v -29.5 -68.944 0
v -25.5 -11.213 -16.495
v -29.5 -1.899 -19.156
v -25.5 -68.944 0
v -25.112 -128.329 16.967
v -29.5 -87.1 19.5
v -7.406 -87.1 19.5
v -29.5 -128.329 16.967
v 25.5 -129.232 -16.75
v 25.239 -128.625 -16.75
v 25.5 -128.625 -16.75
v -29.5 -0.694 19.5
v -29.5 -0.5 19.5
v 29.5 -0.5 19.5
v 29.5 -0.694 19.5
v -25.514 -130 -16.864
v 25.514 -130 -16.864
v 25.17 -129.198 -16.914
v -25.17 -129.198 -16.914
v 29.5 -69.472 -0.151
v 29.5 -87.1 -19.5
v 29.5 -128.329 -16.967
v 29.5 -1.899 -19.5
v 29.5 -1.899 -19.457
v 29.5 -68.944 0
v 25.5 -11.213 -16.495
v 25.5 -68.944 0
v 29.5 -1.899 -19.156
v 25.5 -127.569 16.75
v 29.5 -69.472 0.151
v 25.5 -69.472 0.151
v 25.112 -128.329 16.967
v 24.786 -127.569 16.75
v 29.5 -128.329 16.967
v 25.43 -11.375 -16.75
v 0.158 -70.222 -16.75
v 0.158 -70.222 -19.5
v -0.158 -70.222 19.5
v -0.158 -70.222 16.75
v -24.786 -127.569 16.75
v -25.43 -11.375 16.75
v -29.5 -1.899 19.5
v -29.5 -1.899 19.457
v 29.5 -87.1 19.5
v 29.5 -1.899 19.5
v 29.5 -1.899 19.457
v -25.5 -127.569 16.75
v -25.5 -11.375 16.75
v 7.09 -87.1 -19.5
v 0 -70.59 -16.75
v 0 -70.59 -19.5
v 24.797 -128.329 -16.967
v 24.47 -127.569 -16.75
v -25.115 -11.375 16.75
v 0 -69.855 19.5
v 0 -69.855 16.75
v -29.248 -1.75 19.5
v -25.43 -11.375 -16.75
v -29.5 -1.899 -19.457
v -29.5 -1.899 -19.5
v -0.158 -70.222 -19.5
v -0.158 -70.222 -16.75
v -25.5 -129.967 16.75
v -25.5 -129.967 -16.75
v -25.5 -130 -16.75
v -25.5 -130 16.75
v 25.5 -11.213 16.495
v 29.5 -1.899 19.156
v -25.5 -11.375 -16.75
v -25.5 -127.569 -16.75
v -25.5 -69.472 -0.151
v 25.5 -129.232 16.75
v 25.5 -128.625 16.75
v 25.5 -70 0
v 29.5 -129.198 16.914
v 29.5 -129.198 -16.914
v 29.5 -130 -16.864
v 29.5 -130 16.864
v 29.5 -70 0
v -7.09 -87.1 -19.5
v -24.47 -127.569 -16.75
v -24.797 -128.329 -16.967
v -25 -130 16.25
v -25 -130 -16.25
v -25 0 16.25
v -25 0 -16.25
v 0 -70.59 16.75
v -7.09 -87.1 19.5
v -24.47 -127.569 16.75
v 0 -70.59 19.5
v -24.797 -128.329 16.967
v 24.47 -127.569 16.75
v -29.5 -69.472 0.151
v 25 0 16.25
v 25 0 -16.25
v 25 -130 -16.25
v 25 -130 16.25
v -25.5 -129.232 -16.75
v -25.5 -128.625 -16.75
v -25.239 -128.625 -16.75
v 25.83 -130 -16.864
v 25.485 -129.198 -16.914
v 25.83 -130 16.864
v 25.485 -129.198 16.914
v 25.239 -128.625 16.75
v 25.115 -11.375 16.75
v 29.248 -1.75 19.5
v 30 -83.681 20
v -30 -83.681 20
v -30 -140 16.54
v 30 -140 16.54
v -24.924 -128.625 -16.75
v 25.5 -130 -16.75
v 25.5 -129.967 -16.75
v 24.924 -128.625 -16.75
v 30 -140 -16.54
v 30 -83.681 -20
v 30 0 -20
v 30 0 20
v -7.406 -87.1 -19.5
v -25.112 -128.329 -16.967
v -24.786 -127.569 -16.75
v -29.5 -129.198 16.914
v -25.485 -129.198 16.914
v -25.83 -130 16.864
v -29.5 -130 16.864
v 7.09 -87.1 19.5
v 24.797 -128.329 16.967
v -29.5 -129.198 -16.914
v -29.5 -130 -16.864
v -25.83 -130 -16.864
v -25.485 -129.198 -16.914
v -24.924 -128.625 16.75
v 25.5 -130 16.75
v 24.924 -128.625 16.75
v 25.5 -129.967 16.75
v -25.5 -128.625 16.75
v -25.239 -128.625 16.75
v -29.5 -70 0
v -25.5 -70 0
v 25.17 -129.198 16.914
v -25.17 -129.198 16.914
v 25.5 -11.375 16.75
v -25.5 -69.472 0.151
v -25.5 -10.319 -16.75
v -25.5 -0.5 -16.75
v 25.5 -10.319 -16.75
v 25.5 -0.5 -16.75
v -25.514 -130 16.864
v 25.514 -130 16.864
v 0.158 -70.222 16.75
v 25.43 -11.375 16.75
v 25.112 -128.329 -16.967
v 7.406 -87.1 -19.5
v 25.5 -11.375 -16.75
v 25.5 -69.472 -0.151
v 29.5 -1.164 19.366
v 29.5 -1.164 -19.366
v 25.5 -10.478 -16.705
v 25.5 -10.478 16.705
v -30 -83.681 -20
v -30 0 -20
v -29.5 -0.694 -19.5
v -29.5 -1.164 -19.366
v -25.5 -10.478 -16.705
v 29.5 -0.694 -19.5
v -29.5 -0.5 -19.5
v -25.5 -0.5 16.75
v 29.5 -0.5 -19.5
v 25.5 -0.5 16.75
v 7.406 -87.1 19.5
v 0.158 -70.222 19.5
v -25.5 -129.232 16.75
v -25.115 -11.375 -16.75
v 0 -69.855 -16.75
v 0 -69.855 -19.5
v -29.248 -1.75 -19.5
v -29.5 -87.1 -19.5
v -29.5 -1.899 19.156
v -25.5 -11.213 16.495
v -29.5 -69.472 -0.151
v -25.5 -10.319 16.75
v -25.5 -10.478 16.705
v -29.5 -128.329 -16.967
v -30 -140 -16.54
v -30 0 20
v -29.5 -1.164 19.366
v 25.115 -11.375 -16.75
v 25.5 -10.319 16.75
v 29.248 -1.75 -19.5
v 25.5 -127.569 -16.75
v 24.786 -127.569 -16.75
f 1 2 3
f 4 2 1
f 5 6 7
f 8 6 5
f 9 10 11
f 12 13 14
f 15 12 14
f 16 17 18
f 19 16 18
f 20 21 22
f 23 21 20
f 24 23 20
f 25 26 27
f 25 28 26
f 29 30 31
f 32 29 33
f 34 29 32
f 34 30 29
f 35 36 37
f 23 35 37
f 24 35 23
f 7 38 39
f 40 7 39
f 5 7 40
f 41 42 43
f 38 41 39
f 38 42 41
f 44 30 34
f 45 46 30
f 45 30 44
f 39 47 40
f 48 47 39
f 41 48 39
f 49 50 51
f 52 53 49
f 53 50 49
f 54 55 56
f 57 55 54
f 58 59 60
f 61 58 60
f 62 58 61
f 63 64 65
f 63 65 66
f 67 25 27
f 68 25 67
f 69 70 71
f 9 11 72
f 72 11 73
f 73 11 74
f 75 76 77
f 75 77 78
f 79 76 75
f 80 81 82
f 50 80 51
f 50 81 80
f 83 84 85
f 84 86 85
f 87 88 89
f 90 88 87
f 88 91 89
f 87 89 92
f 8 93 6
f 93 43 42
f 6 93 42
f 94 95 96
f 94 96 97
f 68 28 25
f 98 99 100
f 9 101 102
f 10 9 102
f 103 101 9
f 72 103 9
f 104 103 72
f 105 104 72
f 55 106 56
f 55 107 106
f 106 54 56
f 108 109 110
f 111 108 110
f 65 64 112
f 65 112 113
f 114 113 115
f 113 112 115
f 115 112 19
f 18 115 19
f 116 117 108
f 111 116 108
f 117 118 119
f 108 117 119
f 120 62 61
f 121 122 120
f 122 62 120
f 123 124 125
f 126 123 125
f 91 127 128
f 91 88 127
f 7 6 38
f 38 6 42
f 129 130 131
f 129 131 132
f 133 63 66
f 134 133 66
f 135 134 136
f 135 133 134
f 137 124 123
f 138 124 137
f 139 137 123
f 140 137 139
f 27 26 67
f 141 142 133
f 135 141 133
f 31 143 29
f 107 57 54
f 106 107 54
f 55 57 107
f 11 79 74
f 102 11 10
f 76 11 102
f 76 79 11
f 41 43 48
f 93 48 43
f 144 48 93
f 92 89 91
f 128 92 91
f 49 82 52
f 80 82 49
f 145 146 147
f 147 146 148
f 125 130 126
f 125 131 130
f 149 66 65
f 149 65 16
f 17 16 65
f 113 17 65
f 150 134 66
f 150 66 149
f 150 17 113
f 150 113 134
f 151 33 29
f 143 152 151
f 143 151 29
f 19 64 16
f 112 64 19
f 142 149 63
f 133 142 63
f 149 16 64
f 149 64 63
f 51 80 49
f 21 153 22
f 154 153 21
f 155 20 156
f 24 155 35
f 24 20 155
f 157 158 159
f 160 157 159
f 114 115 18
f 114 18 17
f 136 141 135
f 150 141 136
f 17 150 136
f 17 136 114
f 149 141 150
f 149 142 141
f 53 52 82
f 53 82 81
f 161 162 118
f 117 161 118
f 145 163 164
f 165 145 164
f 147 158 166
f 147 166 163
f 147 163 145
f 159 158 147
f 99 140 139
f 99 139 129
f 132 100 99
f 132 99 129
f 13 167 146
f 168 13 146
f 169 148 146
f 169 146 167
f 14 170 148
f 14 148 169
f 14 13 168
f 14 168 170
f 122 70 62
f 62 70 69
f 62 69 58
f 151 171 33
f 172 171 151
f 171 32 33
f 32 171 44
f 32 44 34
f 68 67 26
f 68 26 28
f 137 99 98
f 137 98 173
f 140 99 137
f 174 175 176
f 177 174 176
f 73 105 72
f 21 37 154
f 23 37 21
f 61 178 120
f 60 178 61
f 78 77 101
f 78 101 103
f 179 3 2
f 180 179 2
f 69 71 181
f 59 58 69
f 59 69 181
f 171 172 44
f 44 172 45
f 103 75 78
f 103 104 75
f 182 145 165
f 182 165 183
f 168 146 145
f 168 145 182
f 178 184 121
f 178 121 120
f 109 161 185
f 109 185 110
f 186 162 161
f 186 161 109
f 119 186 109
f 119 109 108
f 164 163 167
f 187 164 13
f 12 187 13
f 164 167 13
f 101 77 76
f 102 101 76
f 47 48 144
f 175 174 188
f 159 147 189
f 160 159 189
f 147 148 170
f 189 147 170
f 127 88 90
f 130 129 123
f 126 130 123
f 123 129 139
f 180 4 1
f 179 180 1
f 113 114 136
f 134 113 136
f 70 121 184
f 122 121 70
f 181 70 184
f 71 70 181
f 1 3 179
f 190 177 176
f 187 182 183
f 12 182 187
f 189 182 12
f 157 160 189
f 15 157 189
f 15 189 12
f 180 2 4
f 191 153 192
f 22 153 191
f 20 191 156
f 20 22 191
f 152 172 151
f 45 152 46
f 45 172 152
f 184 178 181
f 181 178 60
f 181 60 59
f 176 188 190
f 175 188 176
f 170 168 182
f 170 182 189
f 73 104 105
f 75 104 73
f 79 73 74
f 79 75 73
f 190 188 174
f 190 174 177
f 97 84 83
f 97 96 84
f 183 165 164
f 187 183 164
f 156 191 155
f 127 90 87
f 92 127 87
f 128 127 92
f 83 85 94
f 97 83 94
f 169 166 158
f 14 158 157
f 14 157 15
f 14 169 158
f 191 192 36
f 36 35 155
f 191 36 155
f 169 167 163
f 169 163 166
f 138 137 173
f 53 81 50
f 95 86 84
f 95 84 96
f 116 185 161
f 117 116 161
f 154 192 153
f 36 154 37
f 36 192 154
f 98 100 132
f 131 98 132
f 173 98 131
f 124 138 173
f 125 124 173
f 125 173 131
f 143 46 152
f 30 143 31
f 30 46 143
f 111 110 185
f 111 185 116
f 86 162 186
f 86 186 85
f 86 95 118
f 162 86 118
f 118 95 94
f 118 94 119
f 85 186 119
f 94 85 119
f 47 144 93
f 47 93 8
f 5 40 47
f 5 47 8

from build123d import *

# Parameters (mm, degrees)
F0_W      = 60
F0_H      = 40
F0_W_2    = 50
F0_H_2    = 32.5
F1_DEPTH  = 140
F2_T      = -0.5
F4_DEPTH  = 40
F6_DEPTH  = 60
F7_DEPTH  = 140
F8_W      = 10
F8_H      = 40
F9_DEPTH  = 60
F11_DEPTH = 60
F12_DEPTH = 60


with BuildPart() as f1:
    # F0 (on Front) → F1 (new body)
    with BuildSketch(Plane.XZ):
        Rectangle(F0_W, F0_H)
        Rectangle(F0_W_2, F0_H_2, mode=Mode.SUBTRACT)
    extrude(amount=F1_DEPTH)

    # F2 (hollow: no face is removed)
    offset(amount=F2_T, kind=Kind.INTERSECTION, mode=Mode.SUBTRACT)

    # F3 (on face) → F4 (join, through all)
    with BuildSketch(Plane.XY.offset(20)):
        Polygon((-29.8089313839, -140), (0, -70.5899032727), (-0.1578061569, -70.2224516363), (-30, -139.71), (-30, -140), align=None)
        Polygon((30, -139.71), (0.1578061569, -70.2224516363), (0, -70.5899032727), (29.8089313839, -140), (30, -140), align=None)
        Polygon((-0.1578061569, -70.2224516363), (0, -69.855), (-30, 0), (-30, -0.3179561596), (-30, -0.7349032727), align=None)
        Polygon((0, -70.5899032727), (0.1578061569, -70.2224516363), (0, -69.855), (-0.1578061569, -70.2224516363), align=None)
        Polygon((0.1578061569, -70.2224516363), (30, -0.7349032727), (30, 0), (0, -69.855), align=None)
    extrude(amount=-F4_DEPTH)

    # F5 (on face) → F6 (join, through all)
    with BuildSketch(Plane.YZ.offset(30)):
        Polygon((-69.472192033, 0.1508022763), (-70, 0), (-69.472192033, -0.1508022763), (-68.9443840661, 0), align=None)
        Polygon((0, 20), (-69.472192033, 0.1508022763), (-68.9443840661, 0), (0, 19.6983954474), align=None)
        Polygon((-68.9443840661, 0), (-69.472192033, -0.1508022763), (0, -20), (0, -19.6983954474), align=None)
        Polygon((-140, 20), (-70, 0), (-69.472192033, 0.1508022763), (-138.9443840661, 20), align=None)
        Polygon((-70, 0), (-140, -20), (-138.9443840661, -20), (-69.472192033, -0.1508022763), align=None)
    extrude(amount=-F6_DEPTH)

    # F0 (on Front) → F7 (cut)
    with BuildSketch(Plane.XZ):
        Rectangle(F0_W_2, F0_H_2)
    extrude(amount=F7_DEPTH, mode=Mode.SUBTRACT)

    # F8 (on face) → F9 (join, through all)
    with BuildSketch(Plane.YZ.offset(30)):
        with Locations((-135, 0)):
            Rectangle(F8_W, F8_H)
    extrude(amount=-F9_DEPTH)

    # F10 (on face) → F11 (cut, through all)
    with BuildSketch(Plane(origin=(-30, 0, 0), x_dir=(0, -1, 0), z_dir=(-1, 0, 0))):
        Polygon((83.6813354429, -20), (140, -20), (140, -16.54), align=None)
        Polygon((83.6813354429, 20), (140, 16.54), (140, 20), align=None)
    extrude(amount=-F11_DEPTH, mode=Mode.SUBTRACT)

    # F10 (on face) → F12 (join, through all)
    with BuildSketch(Plane(origin=(-30, 0, 0), x_dir=(0, -1, 0), z_dir=(-1, 0, 0))):
        Polygon((78.9609849453, 20), (140, 16.25), (140, 16.54), (83.6813354429, 20), align=None)
        Polygon((83.6813354429, -20), (140, -16.54), (140, -16.25), (78.9609849453, -20), align=None)
    extrude(amount=-F12_DEPTH)


solid = f1.part
